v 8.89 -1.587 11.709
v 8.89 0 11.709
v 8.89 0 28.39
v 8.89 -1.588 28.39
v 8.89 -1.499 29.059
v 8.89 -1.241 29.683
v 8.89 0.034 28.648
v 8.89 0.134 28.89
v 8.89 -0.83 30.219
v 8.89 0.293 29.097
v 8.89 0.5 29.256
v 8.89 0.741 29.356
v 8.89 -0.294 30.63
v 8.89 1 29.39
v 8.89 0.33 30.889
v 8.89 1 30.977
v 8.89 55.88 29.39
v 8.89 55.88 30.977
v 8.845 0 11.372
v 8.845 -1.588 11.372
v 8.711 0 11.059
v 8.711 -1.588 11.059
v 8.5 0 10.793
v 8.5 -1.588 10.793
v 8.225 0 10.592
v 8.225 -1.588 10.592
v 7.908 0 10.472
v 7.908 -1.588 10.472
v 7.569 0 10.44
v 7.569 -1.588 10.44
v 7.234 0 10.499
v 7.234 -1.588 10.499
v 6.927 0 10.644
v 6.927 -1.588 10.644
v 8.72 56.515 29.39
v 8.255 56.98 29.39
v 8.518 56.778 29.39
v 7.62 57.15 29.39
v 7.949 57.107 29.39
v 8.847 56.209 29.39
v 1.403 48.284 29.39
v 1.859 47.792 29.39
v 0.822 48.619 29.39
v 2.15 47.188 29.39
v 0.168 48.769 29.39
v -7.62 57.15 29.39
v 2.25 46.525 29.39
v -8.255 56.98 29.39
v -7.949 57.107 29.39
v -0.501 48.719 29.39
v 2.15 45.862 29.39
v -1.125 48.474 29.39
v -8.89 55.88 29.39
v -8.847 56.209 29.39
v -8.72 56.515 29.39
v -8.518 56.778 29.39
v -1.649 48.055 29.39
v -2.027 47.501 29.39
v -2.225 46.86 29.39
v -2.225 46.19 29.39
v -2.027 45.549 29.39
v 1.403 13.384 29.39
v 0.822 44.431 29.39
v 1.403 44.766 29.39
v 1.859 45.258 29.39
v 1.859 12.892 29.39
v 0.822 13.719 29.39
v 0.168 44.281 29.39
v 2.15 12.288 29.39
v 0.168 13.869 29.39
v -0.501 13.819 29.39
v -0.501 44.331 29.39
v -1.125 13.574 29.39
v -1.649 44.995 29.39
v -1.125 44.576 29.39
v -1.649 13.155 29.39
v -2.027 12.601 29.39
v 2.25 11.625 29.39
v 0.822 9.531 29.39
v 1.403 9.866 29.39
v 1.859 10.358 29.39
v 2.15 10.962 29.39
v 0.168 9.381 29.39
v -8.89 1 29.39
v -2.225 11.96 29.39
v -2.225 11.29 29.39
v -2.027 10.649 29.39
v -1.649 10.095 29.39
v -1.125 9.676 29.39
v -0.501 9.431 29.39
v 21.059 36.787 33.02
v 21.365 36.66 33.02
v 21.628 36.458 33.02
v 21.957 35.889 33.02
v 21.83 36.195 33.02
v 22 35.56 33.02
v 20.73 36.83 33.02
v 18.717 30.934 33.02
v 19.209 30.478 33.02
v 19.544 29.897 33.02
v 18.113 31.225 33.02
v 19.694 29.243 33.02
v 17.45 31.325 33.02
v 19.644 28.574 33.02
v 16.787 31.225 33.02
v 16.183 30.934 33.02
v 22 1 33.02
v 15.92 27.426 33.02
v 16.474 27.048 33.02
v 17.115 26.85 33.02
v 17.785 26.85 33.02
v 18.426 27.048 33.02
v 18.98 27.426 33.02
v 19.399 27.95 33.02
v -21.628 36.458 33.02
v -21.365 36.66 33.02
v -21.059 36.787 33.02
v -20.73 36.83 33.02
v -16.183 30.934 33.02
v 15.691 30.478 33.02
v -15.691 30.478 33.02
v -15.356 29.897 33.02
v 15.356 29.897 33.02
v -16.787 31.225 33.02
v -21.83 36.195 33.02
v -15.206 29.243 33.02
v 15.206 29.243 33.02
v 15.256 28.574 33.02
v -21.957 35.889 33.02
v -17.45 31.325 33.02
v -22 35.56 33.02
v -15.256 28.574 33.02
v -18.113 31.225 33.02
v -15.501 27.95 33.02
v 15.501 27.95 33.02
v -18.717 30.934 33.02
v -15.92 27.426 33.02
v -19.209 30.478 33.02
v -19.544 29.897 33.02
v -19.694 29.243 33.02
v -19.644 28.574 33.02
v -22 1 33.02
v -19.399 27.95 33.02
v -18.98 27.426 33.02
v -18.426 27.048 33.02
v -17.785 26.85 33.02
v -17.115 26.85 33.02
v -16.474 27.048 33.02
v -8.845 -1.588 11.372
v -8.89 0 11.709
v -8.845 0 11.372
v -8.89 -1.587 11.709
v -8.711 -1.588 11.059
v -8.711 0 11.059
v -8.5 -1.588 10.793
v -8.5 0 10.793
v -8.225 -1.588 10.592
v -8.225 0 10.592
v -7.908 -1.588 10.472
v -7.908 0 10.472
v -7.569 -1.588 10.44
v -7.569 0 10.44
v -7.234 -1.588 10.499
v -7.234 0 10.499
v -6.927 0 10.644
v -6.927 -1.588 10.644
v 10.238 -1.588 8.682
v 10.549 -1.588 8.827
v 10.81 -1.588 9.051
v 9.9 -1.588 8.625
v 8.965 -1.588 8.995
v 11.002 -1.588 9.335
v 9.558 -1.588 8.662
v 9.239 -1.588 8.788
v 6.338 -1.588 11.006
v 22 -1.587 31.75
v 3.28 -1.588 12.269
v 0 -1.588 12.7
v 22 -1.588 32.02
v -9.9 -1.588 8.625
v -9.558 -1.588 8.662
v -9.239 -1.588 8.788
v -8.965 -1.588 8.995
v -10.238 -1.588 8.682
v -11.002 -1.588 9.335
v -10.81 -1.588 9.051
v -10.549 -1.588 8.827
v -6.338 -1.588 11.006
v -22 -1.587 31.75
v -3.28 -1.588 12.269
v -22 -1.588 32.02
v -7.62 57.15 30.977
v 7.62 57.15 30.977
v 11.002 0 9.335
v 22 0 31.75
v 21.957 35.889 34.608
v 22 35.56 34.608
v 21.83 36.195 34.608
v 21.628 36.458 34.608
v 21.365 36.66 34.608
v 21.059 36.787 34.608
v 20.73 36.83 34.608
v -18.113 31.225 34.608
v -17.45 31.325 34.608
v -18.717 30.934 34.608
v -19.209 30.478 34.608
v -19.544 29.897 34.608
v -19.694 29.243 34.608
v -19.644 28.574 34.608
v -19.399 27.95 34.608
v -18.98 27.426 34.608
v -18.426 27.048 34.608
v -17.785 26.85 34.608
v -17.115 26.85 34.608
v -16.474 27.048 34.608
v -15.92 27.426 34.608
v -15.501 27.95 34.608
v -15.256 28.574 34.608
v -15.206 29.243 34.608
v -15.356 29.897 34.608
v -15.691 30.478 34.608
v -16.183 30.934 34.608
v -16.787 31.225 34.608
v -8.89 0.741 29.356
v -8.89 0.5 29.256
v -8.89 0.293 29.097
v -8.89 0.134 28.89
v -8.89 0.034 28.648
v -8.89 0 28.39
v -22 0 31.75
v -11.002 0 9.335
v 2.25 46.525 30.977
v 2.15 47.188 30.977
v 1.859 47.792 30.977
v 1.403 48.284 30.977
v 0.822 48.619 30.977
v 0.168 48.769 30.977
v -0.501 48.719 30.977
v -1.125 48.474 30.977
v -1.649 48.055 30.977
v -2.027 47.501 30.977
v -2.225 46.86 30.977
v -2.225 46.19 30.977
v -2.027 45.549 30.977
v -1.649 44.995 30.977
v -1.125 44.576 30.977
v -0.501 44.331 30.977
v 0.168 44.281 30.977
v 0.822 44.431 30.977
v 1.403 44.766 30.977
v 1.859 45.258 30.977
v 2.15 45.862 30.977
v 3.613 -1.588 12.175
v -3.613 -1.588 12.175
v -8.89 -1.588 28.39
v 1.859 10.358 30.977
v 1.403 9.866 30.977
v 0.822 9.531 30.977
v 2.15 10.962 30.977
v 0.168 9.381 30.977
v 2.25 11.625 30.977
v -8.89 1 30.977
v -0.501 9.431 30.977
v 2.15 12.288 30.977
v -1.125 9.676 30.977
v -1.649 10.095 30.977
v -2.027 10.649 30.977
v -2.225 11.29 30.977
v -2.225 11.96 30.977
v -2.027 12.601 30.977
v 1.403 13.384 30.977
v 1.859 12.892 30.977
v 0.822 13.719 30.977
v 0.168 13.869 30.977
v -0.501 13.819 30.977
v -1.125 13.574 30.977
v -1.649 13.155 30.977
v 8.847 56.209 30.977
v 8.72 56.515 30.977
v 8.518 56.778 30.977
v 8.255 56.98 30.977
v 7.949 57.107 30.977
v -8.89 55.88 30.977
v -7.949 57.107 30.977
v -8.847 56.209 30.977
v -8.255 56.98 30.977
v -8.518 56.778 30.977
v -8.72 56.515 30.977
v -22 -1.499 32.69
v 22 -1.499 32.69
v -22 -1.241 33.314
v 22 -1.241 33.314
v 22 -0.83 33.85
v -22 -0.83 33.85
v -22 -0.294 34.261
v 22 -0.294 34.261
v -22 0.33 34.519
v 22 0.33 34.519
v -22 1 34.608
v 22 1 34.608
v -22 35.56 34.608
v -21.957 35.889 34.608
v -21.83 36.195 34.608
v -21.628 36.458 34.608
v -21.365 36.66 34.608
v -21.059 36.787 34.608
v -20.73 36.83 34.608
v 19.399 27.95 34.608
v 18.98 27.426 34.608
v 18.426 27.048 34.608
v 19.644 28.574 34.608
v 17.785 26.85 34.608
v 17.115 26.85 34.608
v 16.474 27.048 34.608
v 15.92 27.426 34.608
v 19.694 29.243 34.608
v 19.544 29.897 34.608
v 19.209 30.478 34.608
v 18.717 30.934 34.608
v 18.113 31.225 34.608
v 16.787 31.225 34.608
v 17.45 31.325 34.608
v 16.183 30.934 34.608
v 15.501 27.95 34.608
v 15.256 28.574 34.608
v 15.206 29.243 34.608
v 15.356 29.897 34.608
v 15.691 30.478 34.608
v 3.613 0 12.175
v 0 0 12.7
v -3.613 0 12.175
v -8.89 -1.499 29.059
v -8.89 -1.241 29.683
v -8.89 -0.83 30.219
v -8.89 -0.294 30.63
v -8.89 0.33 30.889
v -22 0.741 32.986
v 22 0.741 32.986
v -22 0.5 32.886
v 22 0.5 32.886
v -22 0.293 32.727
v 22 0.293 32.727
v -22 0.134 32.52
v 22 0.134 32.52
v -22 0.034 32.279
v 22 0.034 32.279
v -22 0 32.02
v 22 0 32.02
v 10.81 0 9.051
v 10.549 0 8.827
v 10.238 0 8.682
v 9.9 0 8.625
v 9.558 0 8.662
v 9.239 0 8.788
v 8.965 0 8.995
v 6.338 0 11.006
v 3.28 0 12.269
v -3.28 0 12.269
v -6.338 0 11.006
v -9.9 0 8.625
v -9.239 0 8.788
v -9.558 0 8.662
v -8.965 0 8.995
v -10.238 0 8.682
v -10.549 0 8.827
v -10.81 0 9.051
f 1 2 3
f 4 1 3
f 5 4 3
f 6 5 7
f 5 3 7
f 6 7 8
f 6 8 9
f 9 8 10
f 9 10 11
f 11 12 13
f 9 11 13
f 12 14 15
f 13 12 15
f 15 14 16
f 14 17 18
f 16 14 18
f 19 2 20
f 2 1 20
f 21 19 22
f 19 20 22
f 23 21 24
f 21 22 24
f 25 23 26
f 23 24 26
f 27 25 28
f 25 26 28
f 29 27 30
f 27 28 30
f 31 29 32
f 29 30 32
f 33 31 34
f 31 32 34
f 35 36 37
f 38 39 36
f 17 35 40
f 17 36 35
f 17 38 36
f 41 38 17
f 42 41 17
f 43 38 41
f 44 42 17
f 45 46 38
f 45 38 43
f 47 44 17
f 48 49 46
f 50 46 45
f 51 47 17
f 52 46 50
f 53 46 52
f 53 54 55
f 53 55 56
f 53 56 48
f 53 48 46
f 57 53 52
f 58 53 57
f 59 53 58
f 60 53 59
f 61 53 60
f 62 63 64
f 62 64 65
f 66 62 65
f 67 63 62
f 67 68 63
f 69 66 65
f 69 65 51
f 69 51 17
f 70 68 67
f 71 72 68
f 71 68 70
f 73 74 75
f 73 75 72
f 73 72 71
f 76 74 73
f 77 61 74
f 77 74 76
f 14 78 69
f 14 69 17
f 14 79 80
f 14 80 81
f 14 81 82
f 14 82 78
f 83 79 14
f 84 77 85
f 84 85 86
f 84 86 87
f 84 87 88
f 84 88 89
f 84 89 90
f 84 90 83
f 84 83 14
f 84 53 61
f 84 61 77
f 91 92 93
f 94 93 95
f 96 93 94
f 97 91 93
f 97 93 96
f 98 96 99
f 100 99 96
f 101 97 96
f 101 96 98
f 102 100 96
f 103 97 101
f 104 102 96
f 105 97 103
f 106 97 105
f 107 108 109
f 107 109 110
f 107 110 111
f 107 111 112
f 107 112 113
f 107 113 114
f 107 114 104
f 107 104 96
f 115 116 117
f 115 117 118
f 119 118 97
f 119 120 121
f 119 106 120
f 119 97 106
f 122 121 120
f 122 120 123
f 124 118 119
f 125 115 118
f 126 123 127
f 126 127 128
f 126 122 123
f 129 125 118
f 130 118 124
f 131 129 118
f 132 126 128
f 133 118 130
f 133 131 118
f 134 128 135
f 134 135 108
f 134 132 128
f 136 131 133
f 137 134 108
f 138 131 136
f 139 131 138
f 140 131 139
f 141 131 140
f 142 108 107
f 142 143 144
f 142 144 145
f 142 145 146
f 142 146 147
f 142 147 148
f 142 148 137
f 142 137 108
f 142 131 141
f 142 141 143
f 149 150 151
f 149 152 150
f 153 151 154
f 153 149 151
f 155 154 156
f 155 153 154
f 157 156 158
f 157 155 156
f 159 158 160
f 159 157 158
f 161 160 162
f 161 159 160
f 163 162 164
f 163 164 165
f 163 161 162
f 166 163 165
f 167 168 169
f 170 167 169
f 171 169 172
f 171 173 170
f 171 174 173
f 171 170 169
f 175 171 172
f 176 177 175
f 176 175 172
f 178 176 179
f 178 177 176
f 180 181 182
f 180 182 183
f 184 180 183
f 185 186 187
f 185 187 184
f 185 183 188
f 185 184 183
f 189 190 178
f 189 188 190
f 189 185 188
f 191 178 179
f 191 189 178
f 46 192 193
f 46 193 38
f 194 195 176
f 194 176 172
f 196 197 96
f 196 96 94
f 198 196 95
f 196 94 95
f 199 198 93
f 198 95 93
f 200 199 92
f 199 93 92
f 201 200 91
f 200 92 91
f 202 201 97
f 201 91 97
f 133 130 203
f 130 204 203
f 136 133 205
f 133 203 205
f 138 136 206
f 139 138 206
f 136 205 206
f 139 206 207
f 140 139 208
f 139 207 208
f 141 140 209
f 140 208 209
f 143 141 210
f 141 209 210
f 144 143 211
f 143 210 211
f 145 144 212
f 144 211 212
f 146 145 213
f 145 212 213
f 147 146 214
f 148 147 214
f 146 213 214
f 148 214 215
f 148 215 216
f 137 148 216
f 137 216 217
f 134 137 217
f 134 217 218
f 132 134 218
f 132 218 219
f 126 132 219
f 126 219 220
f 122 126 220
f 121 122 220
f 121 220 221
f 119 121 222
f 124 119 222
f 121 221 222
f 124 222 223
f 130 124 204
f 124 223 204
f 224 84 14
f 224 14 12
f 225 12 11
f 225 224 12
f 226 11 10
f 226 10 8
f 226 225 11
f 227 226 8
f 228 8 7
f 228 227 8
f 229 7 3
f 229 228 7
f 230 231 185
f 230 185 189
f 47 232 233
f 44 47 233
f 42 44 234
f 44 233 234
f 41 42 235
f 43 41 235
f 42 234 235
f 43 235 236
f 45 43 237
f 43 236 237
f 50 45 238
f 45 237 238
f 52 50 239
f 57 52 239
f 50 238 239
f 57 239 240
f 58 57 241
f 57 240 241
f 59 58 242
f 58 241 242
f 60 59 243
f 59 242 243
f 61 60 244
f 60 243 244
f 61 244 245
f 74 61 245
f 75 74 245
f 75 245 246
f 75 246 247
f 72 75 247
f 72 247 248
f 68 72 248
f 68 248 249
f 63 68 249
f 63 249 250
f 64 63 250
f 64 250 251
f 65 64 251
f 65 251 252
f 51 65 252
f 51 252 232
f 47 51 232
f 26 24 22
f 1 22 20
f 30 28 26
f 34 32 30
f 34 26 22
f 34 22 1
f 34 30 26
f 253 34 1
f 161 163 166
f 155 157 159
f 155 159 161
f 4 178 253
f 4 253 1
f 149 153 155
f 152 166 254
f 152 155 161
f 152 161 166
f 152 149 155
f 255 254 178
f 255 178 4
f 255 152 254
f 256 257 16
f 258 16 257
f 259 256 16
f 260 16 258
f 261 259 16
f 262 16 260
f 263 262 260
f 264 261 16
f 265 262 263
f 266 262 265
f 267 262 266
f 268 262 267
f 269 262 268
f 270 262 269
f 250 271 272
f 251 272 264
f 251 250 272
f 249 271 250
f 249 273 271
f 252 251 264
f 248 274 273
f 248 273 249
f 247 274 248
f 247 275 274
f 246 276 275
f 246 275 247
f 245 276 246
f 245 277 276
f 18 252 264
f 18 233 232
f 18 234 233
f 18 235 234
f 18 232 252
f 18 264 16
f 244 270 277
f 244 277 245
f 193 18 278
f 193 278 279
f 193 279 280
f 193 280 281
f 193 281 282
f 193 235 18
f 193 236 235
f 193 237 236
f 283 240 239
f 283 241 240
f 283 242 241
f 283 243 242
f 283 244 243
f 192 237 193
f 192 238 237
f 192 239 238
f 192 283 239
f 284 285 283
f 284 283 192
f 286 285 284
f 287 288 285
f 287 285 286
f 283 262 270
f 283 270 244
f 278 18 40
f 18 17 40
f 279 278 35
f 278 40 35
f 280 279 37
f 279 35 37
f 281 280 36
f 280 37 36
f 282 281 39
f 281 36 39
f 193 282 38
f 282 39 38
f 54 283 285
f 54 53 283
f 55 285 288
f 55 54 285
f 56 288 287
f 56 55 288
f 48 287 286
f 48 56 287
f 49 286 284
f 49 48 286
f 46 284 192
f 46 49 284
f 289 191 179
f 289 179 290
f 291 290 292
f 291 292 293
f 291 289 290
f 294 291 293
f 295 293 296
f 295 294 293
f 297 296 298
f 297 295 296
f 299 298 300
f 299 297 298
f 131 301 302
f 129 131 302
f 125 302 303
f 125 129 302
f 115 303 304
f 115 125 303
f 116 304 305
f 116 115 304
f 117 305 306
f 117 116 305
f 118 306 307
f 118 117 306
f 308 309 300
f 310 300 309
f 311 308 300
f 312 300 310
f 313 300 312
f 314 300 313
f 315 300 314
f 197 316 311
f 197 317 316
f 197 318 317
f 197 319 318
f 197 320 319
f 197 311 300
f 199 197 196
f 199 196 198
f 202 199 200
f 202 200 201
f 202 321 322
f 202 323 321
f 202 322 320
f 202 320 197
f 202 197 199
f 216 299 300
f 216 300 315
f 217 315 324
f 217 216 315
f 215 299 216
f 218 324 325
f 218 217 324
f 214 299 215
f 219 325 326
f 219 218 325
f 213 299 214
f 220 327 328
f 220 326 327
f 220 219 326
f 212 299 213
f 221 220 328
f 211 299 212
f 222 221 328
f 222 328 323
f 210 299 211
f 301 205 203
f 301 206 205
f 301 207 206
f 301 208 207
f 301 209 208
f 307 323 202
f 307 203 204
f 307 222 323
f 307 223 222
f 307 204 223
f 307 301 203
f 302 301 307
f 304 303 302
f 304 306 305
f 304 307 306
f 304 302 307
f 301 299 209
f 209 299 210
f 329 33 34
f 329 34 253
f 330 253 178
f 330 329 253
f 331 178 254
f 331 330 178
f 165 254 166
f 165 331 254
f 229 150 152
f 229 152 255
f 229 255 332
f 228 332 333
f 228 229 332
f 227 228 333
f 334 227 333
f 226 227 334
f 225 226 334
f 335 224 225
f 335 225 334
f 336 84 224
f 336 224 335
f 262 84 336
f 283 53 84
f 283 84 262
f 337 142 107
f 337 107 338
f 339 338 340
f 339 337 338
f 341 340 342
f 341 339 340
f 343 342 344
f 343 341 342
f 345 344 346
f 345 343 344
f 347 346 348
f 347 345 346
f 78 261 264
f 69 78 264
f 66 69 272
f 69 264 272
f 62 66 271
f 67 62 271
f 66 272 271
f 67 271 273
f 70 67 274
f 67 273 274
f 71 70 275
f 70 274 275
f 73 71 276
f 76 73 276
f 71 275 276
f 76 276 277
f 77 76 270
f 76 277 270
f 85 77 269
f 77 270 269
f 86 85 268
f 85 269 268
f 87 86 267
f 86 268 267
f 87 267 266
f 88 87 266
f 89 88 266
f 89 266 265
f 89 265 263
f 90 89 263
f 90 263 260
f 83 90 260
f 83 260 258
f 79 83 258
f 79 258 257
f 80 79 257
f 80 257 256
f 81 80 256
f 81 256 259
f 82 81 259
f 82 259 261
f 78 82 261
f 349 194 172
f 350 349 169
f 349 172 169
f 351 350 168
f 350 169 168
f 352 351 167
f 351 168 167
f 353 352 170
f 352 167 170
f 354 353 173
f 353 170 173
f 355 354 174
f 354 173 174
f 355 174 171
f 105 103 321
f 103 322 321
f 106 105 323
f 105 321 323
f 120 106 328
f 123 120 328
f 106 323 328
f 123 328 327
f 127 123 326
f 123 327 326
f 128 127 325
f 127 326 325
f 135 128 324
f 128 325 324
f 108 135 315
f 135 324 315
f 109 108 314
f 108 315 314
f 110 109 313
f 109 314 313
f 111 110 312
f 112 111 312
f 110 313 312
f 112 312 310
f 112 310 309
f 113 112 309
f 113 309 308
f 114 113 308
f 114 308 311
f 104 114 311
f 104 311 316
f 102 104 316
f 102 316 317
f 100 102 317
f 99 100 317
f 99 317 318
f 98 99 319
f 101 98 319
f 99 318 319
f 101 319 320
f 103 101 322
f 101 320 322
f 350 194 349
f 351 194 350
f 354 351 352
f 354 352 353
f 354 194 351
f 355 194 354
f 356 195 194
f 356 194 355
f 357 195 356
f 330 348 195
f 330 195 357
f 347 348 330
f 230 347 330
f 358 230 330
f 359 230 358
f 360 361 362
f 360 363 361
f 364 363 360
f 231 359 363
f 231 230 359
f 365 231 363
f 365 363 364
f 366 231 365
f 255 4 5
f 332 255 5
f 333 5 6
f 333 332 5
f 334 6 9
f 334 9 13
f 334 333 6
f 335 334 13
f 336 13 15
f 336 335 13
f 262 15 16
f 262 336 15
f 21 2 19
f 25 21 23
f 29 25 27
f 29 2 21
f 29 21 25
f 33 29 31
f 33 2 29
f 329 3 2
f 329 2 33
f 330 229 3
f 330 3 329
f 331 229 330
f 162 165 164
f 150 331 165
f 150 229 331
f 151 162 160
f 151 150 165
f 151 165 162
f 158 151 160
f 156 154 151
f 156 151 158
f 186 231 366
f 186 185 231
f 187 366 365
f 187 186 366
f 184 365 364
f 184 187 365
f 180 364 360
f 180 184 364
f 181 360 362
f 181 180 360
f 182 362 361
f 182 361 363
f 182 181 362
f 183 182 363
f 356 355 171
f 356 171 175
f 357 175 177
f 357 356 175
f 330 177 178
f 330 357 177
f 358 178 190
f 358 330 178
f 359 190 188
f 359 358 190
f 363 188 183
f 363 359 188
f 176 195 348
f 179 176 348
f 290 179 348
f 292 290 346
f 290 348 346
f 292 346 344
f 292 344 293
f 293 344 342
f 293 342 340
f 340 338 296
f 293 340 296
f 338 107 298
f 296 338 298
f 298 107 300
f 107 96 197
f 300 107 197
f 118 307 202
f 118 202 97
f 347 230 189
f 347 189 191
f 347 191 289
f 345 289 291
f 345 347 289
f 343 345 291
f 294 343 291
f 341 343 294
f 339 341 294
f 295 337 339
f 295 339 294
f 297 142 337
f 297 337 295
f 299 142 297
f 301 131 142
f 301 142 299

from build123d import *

# Parameters (mm, degrees)
BASE_FLANGE1_DEPTH            = 1.5875
EDGE_FLANGE1_DEPTH            = 17.78
M4_CLEARANCE_HOLE1_D          = 4.5
FILLET1_R                     = 1.27
BASE_FLANGE2_DEPTH            = 1.5875
EDGE_FLANGE2_DEPTH            = 43.999999884
SKETCH21_W                    = 2.25
SKETCH21_H                    = 1.5875
M4_CLEARANCE_HOLE2_AT_2_COUNT = 2
M4_CLEARANCE_HOLE2_AT_2_PITCH = 34.9
FILLET2_R                     = 1.27


# Sheet-metal steps are written as plain solids
with BuildPart() as part:
    # Sketch1 → Base-Flange1 (new body)
    with BuildSketch(Plane(origin=(0, 0, 0), x_dir=(1, 0, 0), z_dir=(0, 1, 0))):
        with BuildLine():
            Line((-8.89, -9.069614104), (-8.89, -28.119614104))
            Line((-8.89, -28.119614104), (8.89, -28.119614104))
            Line((8.89, -28.119614104), (8.89, -9.069614104))
            ThreePointArc((8.89, -9.069614104), (0, -12.7), (-8.89, -9.069614104))
        make_face()
    extrude(amount=-BASE_FLANGE1_DEPTH)

    # Edge-Flange1 section (across the edge) → Edge-Flange1 (add)
    with BuildSketch(Plane(origin=(-8.89, 0, 29.389614104), x_dir=(0, 0, -1), z_dir=(1, 0, 0))):
        with BuildLine():
            Line((-1.5875, 1), (-1.5875, 57.15))
            Line((-1.5875, 57.15), (0, 57.15))
            Line((0, 57.15), (0, 1))
            ThreePointArc((0, 1), (0.292893219, 0.292893219), (1, 0))
            Line((1, 0), (1.27, 0))
            Line((1.27, 0), (1.27, -1.5875))
            Line((1.27, -1.5875), (1, -1.5875))
            ThreePointArc((1, -1.5875), (-0.829638796, -0.829638796), (-1.5875, 1))
        make_face()
    extrude(amount=EDGE_FLANGE1_DEPTH)

    # M4 Clearance Hole1 (through all)
    with Locations(Plane(origin=(0, 0, 29.389614104), x_dir=(-1, 0, 0), z_dir=(0, 0, -1))):
        with Locations((0, 46.524999898), (0, 11.625)):
            Hole(M4_CLEARANCE_HOLE1_D / 2)

    # Fillet1
    fillet1_edges = [part.edges().sort_by_distance(p)[0] for p in [
        (-8.89, 57.15, 30.183364104),
        (8.89, 57.15, 30.183364104),
        (8.89, -0.79375, 9.069614104),
        (-8.89, -0.79375, 9.069614104),
    ]]
    fillet(fillet1_edges, radius=FILLET1_R)


with BuildPart() as body_2:
    # Sketch12 → Base-Flange2 (new body)
    with BuildSketch(Plane(origin=(0, 0, 0), x_dir=(1, 0, 0), z_dir=(0, 1, 0))):
        with BuildLine():
            Line((-21.999999942, -31.75), (0, -31.75))
            Line((0, -31.75), (21.999999942, -31.75))
            Line((21.999999942, -31.75), (10.16, -7.62))
            ThreePointArc((10.16, -7.62), (0, -12.7), (-10.16, -7.62))
            Line((-10.16, -7.62), (-21.999999942, -31.75))
        make_face()
    extrude(amount=-BASE_FLANGE2_DEPTH)

    # Edge-Flange2 section (across the edge) → Edge-Flange2 (add)
    with BuildSketch(Plane(origin=(-21.999999942, 0, 33.02), x_dir=(0, 0, -1), z_dir=(1, 0, 0))):
        with BuildLine():
            Line((-1.5875, 1), (-1.5875, 36.83))
            Line((-1.5875, 36.83), (0, 36.83))
            Line((0, 36.83), (0, 1))
            ThreePointArc((0, 1), (0.292893219, 0.292893219), (1, 0))
            Line((1, 0), (1.27, 0))
            Line((1.27, 0), (1.27, -1.5875))
            Line((1.27, -1.5875), (1, -1.5875))
            ThreePointArc((1, -1.5875), (-0.829638796, -0.829638796), (-1.5875, 1))
        make_face()
    extrude(amount=EDGE_FLANGE2_DEPTH)

    # Sketch21 → M4 Clearance Hole2 (revolve, cut)
    with BuildSketch(Plane(origin=(17.45, 29.075, 33.02), x_dir=(0, 1, 0), z_dir=(1, 0, 0))):
        with Locations((1.125, 0.79375)):
            Rectangle(SKETCH21_W, SKETCH21_H)
    m4_clearance_hole2 = revolve(axis=Axis((17.45, 29.075, 26.67), (0, 0, 1)), mode=Mode.SUBTRACT)

    # M4 Clearance Hole2 at 2: M4 Clearance Hole2 ×2
    with Locations(*[(-i * M4_CLEARANCE_HOLE2_AT_2_PITCH, 0, 0) for i in range(1, M4_CLEARANCE_HOLE2_AT_2_COUNT)]):
        add(m4_clearance_hole2, mode=Mode.SUBTRACT)

    # Fillet2
    fillet2_edges = [body_2.edges().sort_by_distance(p)[0] for p in [
        (-21.999999942, 36.83, 33.81375),
        (21.999999942, 36.83, 33.81375),
        (-10.16, -0.79375, 7.62),
        (10.16, -0.79375, 7.62),
    ]]
    fillet(fillet2_edges, radius=FILLET2_R)


solid = Compound([part.part, body_2.part])
